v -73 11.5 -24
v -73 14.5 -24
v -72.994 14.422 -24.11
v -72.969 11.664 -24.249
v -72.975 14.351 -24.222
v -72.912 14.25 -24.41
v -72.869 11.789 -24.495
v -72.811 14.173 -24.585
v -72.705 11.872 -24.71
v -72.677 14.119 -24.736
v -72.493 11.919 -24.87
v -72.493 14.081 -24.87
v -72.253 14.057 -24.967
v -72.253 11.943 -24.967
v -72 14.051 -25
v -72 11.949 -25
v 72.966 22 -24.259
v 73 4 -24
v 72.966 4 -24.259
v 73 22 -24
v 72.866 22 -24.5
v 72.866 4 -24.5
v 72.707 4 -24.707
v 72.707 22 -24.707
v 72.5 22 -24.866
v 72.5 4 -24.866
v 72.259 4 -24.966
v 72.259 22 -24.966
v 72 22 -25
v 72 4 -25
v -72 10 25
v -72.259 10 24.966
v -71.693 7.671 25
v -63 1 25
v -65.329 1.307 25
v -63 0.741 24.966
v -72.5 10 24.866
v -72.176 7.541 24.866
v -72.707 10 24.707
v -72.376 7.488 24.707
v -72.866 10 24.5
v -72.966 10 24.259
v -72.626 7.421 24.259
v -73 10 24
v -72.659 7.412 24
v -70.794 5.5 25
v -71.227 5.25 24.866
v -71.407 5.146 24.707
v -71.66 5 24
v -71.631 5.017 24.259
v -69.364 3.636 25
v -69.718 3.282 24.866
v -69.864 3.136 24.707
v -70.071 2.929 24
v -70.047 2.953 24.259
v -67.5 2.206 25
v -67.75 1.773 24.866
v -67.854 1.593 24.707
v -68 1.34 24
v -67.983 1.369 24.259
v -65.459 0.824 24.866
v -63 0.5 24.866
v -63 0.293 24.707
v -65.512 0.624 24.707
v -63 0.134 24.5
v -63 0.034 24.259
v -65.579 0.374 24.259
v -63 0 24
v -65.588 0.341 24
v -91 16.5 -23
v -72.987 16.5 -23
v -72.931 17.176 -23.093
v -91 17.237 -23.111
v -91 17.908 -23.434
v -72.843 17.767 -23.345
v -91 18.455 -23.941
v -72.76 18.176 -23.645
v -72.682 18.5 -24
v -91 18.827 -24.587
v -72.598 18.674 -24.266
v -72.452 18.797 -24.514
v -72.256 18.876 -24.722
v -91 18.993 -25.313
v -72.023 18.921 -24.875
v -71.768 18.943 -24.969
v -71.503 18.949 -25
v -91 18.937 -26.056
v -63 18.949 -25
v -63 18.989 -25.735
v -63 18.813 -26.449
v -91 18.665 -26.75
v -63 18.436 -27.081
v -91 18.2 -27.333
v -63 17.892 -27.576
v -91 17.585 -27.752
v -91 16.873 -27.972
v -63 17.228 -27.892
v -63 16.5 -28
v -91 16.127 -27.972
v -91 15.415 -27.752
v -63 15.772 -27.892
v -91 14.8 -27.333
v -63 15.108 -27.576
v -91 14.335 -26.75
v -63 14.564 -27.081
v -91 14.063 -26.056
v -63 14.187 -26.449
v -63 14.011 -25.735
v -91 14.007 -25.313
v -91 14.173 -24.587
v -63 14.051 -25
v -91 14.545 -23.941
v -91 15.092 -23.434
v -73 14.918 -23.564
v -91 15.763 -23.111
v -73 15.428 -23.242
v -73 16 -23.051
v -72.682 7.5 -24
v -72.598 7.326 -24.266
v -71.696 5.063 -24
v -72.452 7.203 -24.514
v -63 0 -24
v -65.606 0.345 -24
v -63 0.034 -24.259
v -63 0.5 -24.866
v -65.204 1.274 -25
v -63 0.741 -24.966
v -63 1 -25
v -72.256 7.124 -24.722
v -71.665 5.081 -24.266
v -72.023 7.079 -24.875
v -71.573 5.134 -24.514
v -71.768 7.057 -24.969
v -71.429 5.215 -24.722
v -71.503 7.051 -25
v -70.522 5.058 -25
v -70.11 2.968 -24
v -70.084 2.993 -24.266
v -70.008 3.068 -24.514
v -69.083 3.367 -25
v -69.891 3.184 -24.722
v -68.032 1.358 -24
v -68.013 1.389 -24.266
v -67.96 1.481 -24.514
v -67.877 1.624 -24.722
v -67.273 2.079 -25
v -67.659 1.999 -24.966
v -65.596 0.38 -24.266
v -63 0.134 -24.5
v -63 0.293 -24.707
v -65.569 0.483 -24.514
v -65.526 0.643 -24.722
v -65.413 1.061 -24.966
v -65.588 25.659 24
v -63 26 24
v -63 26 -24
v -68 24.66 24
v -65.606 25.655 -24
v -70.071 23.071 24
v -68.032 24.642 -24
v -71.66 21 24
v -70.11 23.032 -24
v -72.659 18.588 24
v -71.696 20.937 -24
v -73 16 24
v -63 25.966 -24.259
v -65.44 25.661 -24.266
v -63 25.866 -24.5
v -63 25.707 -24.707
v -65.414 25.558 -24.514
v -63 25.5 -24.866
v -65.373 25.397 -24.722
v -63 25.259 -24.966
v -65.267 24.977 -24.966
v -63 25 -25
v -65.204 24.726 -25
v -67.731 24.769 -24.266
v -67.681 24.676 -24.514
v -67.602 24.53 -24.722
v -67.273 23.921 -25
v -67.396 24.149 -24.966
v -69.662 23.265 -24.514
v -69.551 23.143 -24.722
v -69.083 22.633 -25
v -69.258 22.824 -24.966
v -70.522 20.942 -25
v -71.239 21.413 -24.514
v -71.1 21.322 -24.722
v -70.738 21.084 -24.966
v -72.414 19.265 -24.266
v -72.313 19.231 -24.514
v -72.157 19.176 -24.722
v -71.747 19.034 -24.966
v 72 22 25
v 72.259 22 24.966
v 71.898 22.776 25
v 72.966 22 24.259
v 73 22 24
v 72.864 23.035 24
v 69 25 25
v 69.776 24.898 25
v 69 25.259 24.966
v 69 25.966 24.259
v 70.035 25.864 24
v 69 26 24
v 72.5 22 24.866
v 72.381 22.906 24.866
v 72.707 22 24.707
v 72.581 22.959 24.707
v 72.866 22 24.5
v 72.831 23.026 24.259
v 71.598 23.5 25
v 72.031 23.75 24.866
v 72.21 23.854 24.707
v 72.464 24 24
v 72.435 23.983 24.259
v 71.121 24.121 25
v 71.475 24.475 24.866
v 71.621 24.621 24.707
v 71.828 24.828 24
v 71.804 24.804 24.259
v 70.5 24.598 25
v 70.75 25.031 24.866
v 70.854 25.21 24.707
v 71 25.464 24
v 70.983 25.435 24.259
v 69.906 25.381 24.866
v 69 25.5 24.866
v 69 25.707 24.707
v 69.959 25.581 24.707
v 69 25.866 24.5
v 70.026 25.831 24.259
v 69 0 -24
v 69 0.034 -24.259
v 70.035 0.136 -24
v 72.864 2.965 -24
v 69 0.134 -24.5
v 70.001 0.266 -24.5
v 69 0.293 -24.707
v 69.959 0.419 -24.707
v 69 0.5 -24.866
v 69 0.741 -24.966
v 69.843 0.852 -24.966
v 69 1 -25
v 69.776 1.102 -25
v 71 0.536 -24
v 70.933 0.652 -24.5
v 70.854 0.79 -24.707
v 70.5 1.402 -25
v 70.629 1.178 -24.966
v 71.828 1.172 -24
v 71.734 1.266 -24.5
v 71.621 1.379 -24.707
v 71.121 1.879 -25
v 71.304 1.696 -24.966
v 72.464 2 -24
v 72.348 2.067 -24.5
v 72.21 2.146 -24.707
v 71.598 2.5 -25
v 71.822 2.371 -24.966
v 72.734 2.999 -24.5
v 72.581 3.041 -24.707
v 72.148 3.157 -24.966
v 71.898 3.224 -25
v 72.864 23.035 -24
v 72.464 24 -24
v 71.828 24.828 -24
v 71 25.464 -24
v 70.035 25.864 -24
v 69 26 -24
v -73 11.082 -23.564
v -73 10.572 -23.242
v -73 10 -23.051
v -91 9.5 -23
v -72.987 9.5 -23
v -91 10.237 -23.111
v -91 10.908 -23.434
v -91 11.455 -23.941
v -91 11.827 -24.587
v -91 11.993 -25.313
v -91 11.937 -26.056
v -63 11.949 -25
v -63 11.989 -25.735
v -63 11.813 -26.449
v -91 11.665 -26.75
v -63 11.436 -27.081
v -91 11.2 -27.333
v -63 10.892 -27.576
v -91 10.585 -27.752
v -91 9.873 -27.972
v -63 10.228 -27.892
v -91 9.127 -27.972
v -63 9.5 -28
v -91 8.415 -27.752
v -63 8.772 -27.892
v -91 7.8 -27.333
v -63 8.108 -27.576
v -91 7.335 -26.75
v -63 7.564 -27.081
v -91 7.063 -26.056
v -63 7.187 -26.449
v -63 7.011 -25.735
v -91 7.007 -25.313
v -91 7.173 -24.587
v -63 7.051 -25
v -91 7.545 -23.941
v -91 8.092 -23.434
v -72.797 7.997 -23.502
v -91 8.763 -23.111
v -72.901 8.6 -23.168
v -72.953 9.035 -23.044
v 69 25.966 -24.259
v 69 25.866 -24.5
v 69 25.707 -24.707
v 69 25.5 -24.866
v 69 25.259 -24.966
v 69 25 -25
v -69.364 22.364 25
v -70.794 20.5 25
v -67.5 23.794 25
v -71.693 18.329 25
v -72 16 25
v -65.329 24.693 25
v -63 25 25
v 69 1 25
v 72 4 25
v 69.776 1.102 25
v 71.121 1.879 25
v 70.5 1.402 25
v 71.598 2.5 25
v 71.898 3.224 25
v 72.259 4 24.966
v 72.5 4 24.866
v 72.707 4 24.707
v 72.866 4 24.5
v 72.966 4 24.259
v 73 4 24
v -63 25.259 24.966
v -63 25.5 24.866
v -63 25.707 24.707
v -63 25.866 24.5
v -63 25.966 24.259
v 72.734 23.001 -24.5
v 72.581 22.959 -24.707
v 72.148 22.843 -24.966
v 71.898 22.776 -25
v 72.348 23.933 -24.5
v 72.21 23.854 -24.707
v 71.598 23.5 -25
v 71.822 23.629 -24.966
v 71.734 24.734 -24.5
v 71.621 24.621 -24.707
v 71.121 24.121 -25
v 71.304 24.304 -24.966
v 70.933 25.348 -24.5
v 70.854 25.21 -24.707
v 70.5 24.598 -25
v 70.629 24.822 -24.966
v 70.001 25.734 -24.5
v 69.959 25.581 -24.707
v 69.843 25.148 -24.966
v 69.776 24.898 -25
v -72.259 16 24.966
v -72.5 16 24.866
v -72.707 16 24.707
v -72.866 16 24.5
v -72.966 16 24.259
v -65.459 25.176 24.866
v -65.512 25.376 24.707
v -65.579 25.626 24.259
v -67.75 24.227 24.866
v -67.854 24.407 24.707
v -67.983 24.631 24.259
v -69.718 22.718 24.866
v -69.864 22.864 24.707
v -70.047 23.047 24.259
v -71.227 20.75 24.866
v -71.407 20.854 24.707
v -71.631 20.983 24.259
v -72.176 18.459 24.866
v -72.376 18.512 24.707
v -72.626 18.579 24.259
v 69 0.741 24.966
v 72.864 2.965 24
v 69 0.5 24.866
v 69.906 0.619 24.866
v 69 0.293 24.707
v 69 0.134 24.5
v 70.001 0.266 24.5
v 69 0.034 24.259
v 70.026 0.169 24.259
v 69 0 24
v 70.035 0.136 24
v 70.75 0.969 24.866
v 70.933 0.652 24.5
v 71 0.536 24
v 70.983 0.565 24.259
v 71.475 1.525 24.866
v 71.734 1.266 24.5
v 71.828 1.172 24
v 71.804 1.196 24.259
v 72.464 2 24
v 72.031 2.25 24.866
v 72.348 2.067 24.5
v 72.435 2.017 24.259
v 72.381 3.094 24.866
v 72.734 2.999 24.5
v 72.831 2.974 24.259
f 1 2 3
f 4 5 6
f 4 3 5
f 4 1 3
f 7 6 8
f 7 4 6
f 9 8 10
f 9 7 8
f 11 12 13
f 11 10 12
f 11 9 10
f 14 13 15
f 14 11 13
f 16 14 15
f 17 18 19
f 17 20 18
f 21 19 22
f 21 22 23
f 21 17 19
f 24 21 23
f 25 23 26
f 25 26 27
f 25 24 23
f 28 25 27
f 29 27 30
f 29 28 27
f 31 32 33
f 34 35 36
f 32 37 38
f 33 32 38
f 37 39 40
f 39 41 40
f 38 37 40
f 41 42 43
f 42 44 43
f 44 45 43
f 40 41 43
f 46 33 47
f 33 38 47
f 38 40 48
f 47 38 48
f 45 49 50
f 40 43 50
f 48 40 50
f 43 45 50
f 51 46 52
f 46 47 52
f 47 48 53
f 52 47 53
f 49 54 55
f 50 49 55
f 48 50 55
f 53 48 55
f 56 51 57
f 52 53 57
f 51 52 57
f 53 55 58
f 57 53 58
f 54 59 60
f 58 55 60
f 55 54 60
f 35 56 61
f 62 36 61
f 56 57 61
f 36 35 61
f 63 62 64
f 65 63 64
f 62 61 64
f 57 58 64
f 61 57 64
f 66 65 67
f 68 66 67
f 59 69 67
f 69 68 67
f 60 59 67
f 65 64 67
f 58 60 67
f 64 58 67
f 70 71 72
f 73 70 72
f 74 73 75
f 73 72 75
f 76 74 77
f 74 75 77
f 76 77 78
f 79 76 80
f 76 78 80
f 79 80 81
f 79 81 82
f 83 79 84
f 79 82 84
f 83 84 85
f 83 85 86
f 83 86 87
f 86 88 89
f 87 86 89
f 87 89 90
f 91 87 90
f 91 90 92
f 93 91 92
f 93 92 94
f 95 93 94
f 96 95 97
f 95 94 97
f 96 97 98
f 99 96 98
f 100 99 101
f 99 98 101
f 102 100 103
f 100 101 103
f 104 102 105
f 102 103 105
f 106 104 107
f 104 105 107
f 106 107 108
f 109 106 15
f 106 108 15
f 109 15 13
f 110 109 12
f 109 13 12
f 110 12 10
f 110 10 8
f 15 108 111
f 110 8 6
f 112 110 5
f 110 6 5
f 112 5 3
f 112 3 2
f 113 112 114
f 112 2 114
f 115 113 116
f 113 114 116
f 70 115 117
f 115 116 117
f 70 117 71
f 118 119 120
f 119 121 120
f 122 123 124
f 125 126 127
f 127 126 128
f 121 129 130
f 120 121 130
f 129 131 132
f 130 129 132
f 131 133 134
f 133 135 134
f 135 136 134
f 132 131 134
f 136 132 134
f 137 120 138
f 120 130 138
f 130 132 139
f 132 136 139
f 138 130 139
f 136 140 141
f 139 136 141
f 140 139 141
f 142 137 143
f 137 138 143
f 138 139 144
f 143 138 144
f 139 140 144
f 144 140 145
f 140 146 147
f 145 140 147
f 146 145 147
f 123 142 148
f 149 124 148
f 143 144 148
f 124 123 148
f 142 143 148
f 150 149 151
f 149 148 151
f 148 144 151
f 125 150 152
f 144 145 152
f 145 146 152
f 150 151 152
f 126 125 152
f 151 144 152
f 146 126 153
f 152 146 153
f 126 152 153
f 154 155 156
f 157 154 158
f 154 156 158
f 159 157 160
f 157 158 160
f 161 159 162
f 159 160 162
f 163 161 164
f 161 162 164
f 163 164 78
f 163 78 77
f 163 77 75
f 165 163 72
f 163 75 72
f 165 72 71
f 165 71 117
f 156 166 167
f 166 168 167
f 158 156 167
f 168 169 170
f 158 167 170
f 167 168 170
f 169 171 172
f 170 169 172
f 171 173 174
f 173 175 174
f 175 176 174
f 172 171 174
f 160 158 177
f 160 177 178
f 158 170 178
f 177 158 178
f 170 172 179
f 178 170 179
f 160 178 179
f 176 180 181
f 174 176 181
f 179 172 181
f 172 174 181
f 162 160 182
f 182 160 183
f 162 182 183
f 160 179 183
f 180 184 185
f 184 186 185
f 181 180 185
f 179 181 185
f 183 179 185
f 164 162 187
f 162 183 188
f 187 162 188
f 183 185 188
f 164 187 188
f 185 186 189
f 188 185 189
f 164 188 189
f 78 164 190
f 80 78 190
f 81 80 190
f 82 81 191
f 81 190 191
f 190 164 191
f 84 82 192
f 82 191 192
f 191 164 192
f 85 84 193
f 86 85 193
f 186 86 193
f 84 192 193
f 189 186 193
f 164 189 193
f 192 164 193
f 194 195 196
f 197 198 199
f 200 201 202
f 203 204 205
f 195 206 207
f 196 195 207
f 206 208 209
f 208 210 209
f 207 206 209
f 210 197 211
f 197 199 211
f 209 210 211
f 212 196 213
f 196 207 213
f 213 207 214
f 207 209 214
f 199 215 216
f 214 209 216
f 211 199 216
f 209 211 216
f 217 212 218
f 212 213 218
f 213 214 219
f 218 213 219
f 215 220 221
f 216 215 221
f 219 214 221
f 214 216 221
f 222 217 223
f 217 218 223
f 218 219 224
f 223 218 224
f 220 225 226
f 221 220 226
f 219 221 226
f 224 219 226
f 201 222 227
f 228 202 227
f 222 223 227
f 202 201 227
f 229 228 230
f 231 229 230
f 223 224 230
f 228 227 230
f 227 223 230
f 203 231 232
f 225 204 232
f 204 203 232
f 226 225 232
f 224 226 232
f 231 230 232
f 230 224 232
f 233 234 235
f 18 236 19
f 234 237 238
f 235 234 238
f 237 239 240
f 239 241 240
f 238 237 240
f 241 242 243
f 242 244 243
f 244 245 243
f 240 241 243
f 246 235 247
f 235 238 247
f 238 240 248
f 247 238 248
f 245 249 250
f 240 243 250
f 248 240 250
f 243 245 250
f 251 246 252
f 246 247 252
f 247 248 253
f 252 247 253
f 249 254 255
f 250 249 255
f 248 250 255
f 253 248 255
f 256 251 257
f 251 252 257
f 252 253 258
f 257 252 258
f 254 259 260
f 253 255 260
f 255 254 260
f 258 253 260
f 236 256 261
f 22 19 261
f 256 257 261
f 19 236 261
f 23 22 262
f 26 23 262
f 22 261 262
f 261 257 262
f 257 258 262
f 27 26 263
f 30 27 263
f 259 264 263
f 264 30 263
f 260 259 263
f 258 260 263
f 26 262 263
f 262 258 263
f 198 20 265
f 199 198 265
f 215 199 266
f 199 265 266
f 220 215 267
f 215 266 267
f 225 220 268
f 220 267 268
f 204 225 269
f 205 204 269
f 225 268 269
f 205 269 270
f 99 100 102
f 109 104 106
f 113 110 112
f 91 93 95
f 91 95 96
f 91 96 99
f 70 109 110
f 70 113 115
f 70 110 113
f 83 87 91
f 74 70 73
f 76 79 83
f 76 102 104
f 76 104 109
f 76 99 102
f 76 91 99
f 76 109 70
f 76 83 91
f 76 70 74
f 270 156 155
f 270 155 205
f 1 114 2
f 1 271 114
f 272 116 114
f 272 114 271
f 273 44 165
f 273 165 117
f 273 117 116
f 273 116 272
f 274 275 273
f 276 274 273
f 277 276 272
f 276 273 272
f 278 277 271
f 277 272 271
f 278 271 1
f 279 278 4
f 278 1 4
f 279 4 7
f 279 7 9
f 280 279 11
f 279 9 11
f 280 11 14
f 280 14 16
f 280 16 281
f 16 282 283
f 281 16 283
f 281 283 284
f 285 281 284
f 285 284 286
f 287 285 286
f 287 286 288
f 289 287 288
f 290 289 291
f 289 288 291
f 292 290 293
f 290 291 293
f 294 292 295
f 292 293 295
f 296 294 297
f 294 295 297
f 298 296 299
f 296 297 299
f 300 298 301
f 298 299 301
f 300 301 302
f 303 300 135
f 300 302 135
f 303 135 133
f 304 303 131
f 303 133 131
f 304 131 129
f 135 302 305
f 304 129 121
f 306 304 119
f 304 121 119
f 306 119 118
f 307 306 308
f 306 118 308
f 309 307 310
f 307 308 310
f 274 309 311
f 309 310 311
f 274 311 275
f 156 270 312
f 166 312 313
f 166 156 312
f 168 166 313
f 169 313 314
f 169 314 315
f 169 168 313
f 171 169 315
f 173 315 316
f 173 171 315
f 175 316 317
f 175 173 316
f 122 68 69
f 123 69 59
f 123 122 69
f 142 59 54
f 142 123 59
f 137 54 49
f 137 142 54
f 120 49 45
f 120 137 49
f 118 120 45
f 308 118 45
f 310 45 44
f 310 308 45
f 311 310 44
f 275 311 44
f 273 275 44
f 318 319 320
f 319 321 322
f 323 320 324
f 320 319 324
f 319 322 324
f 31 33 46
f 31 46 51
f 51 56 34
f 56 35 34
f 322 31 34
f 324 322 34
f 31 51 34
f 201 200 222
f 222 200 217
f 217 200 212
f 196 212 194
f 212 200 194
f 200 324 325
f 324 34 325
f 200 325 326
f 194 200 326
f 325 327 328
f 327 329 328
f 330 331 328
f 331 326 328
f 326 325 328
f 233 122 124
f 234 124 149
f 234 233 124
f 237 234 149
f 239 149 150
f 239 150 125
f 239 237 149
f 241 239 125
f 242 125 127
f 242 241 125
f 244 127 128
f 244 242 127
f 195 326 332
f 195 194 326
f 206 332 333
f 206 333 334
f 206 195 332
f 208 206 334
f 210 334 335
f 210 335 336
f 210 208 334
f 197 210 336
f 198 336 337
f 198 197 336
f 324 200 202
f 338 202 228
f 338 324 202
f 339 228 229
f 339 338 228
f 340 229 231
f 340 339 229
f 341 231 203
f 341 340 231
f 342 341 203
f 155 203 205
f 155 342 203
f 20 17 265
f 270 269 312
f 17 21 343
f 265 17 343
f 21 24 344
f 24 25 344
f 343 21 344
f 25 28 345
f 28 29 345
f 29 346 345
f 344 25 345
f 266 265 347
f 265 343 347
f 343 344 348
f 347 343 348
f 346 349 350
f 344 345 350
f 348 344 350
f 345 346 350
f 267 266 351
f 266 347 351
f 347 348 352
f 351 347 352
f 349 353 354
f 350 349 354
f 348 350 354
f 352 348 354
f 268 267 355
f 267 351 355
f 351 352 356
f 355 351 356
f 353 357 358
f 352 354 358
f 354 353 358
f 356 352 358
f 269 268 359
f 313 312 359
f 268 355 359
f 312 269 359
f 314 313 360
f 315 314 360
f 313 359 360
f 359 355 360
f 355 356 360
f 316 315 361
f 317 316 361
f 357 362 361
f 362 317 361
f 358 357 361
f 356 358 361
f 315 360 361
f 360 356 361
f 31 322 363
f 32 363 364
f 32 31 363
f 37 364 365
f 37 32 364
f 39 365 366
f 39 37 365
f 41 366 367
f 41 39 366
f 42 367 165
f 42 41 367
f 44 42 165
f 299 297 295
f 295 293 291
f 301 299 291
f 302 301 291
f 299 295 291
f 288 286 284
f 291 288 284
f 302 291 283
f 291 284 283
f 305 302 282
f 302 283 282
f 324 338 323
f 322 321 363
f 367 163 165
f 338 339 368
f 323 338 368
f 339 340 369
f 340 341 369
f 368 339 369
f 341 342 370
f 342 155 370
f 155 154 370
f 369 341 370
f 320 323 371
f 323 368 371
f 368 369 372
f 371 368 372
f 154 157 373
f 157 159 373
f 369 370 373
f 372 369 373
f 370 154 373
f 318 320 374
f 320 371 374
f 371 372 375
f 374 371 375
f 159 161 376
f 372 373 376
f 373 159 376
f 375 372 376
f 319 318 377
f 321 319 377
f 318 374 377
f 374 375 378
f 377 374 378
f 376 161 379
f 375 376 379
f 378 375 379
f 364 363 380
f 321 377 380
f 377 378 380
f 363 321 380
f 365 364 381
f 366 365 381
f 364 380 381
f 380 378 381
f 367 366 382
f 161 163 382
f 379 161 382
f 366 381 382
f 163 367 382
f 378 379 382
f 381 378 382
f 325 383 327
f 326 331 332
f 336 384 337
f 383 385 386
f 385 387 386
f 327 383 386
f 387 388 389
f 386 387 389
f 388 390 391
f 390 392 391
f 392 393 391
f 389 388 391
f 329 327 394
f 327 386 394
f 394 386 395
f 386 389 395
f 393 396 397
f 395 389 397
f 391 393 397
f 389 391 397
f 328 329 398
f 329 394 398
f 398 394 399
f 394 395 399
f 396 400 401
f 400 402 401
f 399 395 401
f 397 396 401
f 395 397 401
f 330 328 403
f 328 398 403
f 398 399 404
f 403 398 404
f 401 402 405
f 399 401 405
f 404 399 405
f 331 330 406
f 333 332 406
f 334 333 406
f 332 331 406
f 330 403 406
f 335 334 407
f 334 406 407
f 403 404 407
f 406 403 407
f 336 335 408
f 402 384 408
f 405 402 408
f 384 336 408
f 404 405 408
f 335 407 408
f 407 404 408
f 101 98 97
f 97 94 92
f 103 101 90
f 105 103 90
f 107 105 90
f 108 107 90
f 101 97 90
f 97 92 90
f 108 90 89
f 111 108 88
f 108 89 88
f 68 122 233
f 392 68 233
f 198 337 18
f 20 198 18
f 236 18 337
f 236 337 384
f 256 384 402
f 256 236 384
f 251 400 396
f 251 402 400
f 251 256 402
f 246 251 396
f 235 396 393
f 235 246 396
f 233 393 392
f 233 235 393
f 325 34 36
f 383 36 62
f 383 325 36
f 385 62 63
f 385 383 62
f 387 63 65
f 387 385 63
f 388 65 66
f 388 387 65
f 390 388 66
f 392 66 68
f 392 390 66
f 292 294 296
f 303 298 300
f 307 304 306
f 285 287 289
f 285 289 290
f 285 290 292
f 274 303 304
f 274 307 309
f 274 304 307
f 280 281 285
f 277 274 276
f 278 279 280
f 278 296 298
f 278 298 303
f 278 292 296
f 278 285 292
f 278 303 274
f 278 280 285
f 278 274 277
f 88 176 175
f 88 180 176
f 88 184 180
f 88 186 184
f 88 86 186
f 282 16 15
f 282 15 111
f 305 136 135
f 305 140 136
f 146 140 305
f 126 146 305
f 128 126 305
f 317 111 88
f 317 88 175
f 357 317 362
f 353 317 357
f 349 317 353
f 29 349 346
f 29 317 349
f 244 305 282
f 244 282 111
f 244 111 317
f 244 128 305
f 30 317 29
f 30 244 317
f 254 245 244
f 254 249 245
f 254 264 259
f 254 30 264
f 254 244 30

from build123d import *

# Parameters (mm, degrees)
SKETCH1_W                = 146
SKETCH1_H                = 50
BOSS_EXTRUDE1_DEPTH      = 26
FILLET1_R                = 4
FILLET2_R                = 10
FILLET3_R                = 1
BOSS_EXTRUDE2_DEPTH      = 18
BOSS_EXTRUDE2_DEPTH_BACK = 10
SKETCH2_R                = 2.5


with BuildPart() as part:
    # Sketch1 → Boss-Extrude1 (new body)
    with BuildSketch(Plane(origin=(0, 0, 0), x_dir=(1, 0, 0), z_dir=(0, 1, 0))):
        Rectangle(SKETCH1_W, SKETCH1_H)
    extrude(amount=BOSS_EXTRUDE1_DEPTH)

    # Fillet1
    fillet1_edges = [part.edges().sort_by_distance(p)[0] for p in [
        (73, 26, 0),
        (73, 0, 0),
    ]]
    fillet(fillet1_edges, radius=FILLET1_R)

    # Fillet2
    fillet2_edges = [part.edges().sort_by_distance(p)[0] for p in [
        (-73, 26, 0),
        (-73, 0, 0),
    ]]
    fillet(fillet2_edges, radius=FILLET2_R)

    # Fillet3
    fillet3_edges = [part.edges().sort_by_distance(p)[0] for p in [
        (73, 13, -25),
        (73, 13, 25),
        (3, 0, -25),
        (3, 26, -25),
        (71.828427125, 24.828427125, -25),
        (71.828427125, 1.171572875, -25),
        (71.828427125, 24.828427125, 25),
        (71.828427125, 1.171572875, 25),
        (-73, 13, 25),
        (-73, 13, -25),
        (3, 0, 25),
        (3, 26, 25),
        (-70.071067812, 23.071067812, 25),
        (-70.071067812, 2.928932188, 25),
        (-70.071067812, 23.071067812, -25),
        (-70.071067812, 2.928932188, -25),
    ]]
    fillet(fillet3_edges, radius=FILLET3_R)

    # Sketch2 → Boss-Extrude2 (add, two sides: drawn at the far end of the back side and taken through both)
    with BuildSketch(Plane.ZY.offset(73).offset(-BOSS_EXTRUDE2_DEPTH_BACK)):
        with Locations((-25.5, 16.5)):
            Circle(SKETCH2_R)
        with Locations((-25.5, 9.5)):
            Circle(SKETCH2_R)
    extrude(amount=BOSS_EXTRUDE2_DEPTH + BOSS_EXTRUDE2_DEPTH_BACK)


solid = part.part
